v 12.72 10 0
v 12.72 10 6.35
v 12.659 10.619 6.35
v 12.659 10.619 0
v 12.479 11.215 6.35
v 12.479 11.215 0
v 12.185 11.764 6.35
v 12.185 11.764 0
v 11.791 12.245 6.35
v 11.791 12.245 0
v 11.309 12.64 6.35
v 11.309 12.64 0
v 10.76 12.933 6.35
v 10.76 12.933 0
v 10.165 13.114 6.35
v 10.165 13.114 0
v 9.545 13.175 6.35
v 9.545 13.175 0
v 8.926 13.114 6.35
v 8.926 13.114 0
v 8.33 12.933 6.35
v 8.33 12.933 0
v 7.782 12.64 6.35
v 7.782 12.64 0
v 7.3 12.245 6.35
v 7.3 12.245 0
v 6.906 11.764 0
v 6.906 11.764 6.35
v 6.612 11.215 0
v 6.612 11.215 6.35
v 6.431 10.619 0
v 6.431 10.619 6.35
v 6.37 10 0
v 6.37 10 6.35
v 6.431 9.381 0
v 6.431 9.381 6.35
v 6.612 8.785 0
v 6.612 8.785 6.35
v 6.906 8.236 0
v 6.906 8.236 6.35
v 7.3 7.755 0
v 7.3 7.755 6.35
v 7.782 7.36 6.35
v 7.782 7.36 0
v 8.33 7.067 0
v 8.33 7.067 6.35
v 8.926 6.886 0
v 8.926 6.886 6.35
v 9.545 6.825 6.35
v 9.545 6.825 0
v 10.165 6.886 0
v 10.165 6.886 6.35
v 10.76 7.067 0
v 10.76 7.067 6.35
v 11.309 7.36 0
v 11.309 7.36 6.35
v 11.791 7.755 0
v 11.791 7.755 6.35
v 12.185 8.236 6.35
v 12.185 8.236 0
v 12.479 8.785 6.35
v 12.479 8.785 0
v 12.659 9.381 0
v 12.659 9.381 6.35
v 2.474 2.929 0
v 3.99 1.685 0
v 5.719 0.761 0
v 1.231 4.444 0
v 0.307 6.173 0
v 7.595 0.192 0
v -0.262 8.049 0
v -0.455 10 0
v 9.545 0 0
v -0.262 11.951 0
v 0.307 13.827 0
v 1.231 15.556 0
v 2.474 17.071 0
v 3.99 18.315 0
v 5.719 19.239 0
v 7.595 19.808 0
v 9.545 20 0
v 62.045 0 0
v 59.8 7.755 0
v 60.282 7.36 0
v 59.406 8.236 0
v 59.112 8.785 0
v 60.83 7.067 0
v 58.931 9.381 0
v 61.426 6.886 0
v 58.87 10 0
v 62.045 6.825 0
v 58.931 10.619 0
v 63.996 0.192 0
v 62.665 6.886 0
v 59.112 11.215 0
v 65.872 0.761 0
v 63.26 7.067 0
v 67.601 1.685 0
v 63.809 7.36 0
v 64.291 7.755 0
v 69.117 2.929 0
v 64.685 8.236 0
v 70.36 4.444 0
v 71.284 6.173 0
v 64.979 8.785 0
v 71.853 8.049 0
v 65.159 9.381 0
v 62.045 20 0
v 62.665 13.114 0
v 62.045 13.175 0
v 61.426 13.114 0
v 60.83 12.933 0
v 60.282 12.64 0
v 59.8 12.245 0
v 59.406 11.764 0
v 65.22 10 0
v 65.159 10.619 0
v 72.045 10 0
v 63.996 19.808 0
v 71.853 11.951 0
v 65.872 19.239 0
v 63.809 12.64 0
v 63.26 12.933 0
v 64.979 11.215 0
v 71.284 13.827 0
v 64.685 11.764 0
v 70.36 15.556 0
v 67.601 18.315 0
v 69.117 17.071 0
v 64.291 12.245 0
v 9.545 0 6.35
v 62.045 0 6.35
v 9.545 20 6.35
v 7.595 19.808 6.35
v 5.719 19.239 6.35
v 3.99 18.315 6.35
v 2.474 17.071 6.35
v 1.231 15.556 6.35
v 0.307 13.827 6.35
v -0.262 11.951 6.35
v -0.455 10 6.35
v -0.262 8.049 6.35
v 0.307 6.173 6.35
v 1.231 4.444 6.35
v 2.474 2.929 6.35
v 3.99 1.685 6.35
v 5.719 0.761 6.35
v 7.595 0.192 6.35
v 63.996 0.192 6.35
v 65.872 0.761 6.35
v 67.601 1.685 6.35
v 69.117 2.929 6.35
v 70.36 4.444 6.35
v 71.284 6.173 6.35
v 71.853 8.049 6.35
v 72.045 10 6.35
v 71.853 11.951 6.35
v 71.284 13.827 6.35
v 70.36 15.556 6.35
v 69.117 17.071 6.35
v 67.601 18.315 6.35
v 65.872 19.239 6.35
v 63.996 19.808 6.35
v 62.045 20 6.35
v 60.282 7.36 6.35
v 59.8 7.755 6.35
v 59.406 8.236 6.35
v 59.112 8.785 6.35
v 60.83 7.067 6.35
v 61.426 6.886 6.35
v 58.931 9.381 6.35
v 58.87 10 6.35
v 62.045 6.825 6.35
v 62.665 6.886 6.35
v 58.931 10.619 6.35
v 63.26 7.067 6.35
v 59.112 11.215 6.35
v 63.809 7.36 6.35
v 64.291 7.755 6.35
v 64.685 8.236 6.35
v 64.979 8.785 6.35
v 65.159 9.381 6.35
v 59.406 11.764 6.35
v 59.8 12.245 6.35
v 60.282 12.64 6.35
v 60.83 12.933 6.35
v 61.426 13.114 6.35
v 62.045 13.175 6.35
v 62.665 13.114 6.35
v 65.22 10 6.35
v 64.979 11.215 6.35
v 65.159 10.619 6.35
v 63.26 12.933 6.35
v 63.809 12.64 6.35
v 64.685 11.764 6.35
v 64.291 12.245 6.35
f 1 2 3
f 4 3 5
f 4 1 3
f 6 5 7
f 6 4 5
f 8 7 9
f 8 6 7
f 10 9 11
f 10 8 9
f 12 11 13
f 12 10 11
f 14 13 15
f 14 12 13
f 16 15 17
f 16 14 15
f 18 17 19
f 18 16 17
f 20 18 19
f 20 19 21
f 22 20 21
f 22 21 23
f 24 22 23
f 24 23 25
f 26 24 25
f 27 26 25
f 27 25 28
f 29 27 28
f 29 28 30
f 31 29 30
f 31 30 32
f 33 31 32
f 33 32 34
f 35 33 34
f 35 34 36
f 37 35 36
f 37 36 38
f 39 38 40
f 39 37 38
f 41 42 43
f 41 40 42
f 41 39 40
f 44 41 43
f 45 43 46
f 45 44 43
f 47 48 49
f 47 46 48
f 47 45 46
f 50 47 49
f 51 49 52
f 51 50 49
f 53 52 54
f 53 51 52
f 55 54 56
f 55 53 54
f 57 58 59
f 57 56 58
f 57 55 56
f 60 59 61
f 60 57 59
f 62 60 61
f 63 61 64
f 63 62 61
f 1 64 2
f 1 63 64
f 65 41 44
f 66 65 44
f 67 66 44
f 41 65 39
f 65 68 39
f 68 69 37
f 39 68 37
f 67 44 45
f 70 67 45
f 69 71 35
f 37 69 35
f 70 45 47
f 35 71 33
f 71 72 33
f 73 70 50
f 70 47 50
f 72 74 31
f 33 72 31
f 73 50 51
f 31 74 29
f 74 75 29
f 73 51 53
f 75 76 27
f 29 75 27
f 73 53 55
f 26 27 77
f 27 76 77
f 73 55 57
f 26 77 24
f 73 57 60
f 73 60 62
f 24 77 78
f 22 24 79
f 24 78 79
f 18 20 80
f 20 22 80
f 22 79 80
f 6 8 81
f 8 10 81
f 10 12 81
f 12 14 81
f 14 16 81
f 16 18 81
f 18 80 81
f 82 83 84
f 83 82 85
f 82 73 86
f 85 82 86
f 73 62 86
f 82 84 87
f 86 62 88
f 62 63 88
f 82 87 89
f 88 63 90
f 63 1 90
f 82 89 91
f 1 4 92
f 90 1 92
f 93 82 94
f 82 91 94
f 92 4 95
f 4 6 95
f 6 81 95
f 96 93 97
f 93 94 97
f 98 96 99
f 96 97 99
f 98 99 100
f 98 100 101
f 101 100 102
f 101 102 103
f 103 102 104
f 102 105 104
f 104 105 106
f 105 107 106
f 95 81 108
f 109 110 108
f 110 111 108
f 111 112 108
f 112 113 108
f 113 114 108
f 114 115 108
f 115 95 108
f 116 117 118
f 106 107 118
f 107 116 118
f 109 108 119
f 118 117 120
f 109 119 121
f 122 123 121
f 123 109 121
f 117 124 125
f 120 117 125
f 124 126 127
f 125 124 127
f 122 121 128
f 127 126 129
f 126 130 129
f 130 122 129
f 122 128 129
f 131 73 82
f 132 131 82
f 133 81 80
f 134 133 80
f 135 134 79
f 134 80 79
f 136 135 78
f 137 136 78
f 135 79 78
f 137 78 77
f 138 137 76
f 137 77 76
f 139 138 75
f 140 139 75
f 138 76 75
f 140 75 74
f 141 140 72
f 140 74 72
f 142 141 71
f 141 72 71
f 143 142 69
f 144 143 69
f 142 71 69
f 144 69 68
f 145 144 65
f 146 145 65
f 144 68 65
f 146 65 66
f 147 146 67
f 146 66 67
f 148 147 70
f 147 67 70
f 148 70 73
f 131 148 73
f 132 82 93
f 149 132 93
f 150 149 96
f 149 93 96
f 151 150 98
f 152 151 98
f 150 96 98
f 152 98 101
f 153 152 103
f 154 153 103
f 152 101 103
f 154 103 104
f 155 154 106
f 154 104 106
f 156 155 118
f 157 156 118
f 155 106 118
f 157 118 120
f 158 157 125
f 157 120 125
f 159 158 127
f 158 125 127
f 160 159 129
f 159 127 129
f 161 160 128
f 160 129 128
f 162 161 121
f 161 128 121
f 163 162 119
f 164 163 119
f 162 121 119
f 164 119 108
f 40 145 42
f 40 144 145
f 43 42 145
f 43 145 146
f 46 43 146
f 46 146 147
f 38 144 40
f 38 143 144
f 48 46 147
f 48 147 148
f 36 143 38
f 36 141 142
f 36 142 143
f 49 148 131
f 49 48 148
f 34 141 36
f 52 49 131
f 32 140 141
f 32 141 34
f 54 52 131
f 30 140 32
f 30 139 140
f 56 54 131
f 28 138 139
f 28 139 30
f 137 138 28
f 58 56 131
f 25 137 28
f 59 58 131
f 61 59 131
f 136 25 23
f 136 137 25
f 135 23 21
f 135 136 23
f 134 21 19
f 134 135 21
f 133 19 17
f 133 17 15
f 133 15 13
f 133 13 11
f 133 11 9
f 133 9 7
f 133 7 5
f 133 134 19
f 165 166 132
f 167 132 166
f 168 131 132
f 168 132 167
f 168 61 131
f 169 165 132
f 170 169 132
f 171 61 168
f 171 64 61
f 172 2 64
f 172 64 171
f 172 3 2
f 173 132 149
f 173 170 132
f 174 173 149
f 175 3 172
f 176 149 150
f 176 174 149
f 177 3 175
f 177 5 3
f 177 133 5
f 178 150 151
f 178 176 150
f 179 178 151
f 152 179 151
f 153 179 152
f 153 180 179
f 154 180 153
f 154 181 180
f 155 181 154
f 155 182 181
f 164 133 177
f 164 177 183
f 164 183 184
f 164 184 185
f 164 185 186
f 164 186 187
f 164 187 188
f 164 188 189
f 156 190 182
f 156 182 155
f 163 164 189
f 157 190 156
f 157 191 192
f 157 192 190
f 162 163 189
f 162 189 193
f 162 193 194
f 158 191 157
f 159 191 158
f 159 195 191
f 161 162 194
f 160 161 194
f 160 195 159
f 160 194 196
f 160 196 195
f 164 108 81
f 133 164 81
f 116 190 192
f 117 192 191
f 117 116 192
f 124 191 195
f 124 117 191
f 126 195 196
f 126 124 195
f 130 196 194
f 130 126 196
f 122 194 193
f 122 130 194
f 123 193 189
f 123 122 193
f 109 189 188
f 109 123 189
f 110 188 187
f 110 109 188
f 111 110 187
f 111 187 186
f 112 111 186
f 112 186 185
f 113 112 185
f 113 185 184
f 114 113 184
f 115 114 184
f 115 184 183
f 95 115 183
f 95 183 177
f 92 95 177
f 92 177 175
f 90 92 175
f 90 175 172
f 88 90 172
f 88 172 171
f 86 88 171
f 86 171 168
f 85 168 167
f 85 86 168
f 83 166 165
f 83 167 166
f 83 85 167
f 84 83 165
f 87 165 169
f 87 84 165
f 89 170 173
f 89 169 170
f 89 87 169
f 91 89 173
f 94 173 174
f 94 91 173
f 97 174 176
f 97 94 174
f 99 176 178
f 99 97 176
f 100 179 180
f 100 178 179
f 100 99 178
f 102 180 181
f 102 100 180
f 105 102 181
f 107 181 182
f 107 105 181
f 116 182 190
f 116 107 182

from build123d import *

# Parameters (mm, degrees)
F2_DEPTH = 6.35
F1_R     = 3.175
F3_DEPTH = 6.351


with BuildPart() as f2:
    # F0 (on Top) → F2 (new body)
    with BuildSketch(Plane.XY):
        with BuildLine():
            Line((9.545455, 0), (62.045455, 0))
            ThreePointArc((62.045455, 0), (72.045455, 10), (62.045455, 20))
            Line((62.045455, 20), (9.545455, 20))
            ThreePointArc((9.545455, 20), (-0.454545, 10), (9.545455, 0))
        make_face()
    extrude(amount=F2_DEPTH)

    # F1 (on face) → F3 (cut, through all)
    with BuildSketch(Plane.XY):
        with Locations((62.045455, 10)):
            Circle(F1_R)
        with Locations((9.545455, 10)):
            Circle(F1_R)
    extrude(amount=F3_DEPTH, mode=Mode.SUBTRACT)


solid = f2.part
